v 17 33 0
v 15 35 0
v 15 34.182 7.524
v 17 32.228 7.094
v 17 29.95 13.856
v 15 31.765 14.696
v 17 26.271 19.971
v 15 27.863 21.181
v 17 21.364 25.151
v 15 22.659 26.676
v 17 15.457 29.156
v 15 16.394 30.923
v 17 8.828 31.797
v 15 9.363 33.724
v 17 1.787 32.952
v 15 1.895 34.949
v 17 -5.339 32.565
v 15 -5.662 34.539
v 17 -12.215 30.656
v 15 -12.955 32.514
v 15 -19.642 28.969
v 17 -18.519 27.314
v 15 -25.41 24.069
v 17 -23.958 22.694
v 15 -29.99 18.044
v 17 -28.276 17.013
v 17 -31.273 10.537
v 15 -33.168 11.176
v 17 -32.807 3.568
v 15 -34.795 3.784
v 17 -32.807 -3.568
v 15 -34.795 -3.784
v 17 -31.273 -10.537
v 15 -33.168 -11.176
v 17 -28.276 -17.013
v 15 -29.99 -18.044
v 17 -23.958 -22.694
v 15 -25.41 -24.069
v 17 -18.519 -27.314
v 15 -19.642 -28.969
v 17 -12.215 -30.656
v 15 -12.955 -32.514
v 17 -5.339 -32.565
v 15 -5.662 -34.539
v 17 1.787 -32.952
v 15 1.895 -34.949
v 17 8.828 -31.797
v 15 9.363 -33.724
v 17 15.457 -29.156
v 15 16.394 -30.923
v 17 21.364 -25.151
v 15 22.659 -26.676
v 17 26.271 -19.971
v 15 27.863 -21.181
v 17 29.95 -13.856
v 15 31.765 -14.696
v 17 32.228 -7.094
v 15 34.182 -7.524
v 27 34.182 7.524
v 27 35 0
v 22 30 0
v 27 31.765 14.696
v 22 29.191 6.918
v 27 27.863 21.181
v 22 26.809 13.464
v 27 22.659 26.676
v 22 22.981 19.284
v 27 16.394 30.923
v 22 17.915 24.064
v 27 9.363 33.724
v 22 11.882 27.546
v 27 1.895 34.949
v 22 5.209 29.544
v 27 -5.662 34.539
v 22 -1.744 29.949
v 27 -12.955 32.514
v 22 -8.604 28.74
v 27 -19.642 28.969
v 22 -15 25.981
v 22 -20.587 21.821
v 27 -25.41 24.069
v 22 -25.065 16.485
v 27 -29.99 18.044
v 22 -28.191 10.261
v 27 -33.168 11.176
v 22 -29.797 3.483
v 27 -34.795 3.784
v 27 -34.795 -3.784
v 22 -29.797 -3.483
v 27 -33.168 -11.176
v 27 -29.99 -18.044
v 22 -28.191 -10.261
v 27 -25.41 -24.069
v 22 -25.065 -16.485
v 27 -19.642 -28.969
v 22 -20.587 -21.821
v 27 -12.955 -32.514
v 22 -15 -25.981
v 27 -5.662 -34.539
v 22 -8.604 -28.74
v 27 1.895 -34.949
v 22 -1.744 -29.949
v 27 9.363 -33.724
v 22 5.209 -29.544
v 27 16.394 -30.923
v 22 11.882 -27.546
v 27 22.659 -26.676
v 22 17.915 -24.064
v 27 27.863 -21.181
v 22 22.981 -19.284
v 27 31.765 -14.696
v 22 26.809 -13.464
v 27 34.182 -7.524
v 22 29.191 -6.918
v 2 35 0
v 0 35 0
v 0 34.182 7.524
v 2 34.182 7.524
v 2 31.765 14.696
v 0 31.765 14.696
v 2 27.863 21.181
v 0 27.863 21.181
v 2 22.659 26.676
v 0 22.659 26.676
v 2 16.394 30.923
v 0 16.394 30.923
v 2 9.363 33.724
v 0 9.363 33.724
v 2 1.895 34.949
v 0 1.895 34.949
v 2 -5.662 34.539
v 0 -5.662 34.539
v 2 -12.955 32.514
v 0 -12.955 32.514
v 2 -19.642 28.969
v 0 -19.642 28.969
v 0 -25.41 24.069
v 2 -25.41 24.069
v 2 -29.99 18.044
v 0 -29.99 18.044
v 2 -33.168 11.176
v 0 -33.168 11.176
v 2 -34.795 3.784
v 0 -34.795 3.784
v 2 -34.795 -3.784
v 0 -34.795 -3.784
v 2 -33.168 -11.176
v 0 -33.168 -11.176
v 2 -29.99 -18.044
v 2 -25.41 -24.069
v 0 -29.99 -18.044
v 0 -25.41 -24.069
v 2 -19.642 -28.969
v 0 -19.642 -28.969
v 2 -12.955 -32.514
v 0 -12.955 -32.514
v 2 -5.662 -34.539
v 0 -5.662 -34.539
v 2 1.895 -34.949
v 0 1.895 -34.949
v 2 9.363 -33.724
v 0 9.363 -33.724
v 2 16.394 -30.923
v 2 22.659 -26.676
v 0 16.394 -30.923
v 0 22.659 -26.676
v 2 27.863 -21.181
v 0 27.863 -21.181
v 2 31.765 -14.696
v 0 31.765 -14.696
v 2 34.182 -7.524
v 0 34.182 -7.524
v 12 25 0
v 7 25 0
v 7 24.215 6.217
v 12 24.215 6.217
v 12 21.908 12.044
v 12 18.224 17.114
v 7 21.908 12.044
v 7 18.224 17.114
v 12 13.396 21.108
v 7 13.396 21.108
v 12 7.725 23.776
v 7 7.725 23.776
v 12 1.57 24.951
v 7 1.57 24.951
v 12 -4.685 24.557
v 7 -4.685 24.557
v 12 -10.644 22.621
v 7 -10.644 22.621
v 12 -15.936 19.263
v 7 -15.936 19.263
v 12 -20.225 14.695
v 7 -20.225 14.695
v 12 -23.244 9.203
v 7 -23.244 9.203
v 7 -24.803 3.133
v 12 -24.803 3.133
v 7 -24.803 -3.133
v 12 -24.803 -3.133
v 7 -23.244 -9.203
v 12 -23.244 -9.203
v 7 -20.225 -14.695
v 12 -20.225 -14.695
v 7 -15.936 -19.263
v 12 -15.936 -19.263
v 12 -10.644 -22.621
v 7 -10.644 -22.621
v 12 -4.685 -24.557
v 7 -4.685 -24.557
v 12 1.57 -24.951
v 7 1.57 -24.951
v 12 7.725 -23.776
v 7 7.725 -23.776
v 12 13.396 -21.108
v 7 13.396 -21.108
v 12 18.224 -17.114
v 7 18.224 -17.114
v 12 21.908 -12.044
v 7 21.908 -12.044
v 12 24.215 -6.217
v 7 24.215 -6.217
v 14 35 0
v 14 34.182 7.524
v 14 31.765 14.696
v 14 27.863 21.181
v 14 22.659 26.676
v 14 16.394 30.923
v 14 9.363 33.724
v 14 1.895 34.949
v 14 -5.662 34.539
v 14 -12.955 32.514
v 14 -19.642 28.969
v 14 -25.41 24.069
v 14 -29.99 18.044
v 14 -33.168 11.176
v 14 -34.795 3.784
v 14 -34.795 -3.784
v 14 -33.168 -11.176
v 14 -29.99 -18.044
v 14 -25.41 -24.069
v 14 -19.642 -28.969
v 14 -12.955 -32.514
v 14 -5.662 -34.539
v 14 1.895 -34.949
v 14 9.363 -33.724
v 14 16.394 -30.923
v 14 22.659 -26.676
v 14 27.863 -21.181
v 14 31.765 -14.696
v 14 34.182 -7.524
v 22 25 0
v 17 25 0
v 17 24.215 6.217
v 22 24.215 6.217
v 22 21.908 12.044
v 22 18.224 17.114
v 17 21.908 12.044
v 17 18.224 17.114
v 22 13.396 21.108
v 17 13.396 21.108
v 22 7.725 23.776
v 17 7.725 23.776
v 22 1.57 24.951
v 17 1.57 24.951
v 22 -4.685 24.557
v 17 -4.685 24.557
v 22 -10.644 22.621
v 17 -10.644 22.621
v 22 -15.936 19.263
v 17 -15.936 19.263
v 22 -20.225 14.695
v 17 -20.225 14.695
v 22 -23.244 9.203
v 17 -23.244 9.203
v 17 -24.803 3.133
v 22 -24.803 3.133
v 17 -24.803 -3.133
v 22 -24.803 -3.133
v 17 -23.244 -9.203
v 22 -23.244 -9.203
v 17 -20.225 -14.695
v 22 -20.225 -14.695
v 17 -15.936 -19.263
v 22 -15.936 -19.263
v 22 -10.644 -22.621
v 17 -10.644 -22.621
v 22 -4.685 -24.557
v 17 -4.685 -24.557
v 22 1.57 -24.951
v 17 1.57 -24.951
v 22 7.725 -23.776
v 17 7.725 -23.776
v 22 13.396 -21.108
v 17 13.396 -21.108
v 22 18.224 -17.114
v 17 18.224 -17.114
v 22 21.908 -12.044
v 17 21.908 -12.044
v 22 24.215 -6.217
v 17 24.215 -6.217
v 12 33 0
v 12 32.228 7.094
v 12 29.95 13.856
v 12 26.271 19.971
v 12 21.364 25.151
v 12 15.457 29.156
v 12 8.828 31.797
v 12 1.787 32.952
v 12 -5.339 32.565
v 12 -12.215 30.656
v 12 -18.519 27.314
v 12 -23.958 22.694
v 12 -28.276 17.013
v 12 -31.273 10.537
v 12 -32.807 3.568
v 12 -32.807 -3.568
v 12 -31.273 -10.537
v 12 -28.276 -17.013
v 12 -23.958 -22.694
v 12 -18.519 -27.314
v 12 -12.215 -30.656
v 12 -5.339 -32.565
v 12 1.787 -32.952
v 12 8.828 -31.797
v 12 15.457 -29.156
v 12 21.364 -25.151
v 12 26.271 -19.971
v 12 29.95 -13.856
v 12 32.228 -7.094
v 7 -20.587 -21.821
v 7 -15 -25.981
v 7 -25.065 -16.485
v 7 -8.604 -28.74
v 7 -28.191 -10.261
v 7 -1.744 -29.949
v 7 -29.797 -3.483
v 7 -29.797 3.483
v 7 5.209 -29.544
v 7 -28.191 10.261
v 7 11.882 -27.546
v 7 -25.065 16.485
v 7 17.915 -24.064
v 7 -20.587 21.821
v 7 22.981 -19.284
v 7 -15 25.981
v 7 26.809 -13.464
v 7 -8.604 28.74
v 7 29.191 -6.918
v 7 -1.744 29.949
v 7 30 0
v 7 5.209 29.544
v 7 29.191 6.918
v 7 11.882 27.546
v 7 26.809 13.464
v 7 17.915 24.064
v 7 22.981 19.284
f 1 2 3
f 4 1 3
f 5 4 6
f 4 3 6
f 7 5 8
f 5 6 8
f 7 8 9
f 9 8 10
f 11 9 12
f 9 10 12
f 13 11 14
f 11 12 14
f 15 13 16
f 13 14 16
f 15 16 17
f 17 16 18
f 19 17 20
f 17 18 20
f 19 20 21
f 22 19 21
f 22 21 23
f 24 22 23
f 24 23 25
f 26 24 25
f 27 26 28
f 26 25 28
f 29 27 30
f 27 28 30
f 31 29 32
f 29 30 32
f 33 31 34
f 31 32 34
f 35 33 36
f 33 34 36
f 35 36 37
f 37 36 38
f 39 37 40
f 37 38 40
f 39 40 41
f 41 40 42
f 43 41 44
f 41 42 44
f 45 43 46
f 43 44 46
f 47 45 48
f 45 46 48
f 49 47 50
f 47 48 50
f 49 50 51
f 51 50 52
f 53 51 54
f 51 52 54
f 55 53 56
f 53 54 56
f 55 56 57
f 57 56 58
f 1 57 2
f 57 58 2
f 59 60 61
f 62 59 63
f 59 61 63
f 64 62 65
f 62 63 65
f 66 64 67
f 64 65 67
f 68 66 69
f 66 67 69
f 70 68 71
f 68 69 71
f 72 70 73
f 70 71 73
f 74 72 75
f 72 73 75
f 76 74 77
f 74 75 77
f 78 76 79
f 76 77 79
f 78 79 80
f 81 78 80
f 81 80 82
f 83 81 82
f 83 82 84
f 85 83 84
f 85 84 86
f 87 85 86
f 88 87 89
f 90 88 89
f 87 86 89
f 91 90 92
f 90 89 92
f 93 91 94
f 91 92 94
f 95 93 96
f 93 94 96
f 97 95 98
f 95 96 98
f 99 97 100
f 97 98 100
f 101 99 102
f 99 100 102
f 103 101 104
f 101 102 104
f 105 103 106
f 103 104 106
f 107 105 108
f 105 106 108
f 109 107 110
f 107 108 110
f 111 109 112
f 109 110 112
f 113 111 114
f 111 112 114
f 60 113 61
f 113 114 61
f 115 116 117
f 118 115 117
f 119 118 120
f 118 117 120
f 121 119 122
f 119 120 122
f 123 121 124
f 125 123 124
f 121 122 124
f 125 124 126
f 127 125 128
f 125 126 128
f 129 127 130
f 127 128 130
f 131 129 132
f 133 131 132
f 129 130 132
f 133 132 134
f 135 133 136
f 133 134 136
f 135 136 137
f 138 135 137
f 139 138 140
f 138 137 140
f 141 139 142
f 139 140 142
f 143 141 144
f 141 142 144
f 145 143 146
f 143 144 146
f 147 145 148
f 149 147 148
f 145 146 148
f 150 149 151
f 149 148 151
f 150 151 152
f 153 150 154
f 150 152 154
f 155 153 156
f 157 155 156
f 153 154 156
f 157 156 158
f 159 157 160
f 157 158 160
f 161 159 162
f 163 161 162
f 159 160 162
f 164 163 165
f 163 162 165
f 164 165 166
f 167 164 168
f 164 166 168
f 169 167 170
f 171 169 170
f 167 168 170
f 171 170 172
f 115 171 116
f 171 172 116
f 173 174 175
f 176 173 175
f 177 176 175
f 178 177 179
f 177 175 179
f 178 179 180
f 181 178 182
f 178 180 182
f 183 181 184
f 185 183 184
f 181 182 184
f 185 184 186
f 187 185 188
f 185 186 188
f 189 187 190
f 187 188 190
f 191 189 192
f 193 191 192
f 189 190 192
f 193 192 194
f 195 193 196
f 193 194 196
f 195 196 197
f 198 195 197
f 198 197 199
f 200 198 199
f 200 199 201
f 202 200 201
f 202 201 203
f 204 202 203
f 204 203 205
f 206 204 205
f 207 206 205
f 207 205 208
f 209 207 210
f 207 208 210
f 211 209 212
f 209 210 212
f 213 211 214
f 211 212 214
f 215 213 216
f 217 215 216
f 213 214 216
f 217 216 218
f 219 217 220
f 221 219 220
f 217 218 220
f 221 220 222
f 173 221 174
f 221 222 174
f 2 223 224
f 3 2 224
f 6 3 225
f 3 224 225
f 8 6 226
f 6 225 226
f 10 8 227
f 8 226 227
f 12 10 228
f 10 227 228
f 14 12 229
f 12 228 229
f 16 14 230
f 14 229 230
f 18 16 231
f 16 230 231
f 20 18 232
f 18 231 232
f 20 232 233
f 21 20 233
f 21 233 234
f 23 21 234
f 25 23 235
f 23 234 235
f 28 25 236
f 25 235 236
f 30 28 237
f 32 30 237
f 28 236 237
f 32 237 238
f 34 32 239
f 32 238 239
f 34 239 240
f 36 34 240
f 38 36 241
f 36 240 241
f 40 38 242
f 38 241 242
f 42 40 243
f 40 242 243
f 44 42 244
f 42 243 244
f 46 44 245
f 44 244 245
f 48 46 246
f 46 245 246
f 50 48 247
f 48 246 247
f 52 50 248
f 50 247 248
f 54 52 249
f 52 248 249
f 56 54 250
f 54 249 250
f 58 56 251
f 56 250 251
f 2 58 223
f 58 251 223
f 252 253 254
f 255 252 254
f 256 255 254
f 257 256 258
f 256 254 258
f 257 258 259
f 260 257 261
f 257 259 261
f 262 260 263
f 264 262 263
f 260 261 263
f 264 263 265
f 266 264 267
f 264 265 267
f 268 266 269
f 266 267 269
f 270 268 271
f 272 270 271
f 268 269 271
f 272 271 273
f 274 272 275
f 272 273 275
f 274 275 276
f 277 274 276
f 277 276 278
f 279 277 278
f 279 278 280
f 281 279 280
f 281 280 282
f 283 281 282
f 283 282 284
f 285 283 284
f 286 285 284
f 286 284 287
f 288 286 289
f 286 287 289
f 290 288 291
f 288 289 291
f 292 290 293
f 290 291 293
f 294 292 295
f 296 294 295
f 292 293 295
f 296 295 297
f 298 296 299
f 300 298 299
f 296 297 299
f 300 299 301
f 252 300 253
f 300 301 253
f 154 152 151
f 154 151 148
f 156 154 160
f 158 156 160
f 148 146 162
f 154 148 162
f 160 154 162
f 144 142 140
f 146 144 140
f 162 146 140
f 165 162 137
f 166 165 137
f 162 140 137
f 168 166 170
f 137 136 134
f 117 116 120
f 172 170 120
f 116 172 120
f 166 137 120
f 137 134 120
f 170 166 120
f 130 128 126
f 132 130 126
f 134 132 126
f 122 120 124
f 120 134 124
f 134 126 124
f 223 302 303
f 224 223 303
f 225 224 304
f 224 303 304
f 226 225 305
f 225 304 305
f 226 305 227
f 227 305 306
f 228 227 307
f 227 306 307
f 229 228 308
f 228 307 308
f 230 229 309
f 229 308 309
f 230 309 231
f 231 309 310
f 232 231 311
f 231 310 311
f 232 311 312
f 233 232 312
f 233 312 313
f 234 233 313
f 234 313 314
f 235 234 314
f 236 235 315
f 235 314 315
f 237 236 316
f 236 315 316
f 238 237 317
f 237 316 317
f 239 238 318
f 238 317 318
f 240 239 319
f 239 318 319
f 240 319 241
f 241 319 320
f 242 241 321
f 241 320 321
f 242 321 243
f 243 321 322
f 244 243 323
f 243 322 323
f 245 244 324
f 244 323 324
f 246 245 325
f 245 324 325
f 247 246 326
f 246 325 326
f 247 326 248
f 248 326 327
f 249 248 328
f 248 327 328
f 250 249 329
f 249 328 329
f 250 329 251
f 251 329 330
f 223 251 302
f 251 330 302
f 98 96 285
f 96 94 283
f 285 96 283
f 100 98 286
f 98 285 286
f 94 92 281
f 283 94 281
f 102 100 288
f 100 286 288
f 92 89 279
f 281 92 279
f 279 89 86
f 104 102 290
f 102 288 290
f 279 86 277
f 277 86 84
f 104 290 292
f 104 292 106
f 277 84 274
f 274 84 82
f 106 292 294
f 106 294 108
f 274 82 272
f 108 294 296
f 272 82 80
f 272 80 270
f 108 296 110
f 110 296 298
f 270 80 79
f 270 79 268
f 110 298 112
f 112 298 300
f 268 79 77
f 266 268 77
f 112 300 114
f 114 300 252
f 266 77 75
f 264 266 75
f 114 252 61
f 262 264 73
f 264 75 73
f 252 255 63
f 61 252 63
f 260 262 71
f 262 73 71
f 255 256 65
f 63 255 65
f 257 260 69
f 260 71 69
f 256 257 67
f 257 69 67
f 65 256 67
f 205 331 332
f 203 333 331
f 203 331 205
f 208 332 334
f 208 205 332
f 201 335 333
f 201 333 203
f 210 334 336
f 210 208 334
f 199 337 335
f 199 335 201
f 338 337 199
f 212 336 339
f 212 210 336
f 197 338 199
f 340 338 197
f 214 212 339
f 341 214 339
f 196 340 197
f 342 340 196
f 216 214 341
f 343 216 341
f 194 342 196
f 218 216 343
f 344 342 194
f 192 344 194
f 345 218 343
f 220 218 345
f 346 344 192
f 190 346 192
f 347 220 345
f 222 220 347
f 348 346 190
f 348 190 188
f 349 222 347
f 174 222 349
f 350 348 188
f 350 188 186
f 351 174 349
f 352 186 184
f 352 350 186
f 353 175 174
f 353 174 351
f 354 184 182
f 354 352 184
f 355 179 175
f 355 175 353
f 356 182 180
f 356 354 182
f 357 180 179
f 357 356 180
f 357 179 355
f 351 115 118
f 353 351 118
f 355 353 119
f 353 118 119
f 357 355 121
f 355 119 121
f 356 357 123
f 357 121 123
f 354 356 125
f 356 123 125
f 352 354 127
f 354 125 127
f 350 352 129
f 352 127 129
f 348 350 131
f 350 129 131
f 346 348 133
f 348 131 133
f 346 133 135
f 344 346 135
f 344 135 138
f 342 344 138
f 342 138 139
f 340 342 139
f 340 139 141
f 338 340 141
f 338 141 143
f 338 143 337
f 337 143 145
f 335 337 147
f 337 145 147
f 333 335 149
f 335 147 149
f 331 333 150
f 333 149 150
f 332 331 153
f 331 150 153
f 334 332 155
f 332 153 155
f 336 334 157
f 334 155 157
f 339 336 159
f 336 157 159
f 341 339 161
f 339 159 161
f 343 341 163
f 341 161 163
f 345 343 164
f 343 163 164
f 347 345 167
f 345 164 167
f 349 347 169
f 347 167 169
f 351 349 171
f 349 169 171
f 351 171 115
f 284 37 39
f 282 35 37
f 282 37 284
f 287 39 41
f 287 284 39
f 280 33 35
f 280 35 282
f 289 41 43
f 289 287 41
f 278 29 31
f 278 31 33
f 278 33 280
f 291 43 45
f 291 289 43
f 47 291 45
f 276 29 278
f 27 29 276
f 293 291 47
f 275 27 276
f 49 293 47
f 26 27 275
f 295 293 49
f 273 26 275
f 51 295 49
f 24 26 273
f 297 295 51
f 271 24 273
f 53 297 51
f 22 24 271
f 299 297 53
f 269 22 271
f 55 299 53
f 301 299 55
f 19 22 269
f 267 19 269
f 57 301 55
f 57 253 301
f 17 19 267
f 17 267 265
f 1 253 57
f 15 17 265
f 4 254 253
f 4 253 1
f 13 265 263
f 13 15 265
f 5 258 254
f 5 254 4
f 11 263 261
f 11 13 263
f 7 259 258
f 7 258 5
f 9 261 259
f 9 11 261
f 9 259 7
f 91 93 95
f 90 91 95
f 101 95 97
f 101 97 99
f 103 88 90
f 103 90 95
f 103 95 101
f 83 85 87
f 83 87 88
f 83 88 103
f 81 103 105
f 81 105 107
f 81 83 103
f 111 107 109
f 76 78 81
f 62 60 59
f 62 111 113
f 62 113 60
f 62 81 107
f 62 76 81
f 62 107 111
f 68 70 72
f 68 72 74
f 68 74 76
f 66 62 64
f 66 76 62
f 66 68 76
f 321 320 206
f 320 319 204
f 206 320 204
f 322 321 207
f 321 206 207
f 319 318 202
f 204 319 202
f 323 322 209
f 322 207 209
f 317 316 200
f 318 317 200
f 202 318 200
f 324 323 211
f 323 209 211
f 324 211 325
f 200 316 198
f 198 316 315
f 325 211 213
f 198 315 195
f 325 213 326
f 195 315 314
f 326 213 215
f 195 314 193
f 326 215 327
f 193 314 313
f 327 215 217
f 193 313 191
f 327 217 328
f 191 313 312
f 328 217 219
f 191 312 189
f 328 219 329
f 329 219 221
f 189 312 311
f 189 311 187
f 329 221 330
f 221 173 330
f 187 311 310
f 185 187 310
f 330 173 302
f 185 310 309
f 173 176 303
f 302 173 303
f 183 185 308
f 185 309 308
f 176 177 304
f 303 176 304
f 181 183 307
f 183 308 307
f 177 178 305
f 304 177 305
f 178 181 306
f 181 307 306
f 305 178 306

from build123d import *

# Parameters (mm, degrees)
F0_R      = 35
F1_DEPTH  = 7
F2_R      = 25
F3_DEPTH  = 5
F5_R      = 35
F6_DEPTH  = 5
F7_R      = 25
F8_DEPTH  = 5
F9_R      = 35
F10_DEPTH = 5
F11_SIZE  = 4.99999
F12_SIZE  = 2


# Not quite as in the source:
# - a fillet or chamfer is up to 0.001 mm smaller than in the source, because OpenCascade refuses the exact size


with BuildPart() as f1:
    # F0 (on Right) → F1 (new body)
    with BuildSketch(Plane.YZ):
        Circle(F0_R)
    extrude(amount=F1_DEPTH)

    # F2 (on face) → F3 (join)
    with BuildSketch(Plane.YZ.offset(7)):
        Circle(F2_R)
    extrude(amount=F3_DEPTH)

    # F5 (on face) → F6 (join)
    with BuildSketch(Plane.YZ.offset(12)):
        Circle(F5_R)
    extrude(amount=F6_DEPTH)

    # F7 (on face) → F8 (join)
    with BuildSketch(Plane.YZ.offset(17)):
        Circle(F7_R)
    extrude(amount=F8_DEPTH)

    # F9 (on face) → F10 (join)
    with BuildSketch(Plane.YZ.offset(22)):
        Circle(F9_R)
    extrude(amount=F10_DEPTH)

    # F11 (size 5 in the source; OpenCascade refuses exactly that, so slightly less here)
    f11_edges = [f1.edges().sort_by_distance(p)[0] for p in [
        (7, -35, 0),
        (22, -35, 0),
    ]]
    chamfer(f11_edges, length=F11_SIZE)

    # F12
    f12_edges = [f1.edges().sort_by_distance(p)[0] for p in [
        (12, -35, 0),
        (17, -35, 0),
    ]]
    chamfer(f12_edges, length=F12_SIZE)


solid = f1.part
